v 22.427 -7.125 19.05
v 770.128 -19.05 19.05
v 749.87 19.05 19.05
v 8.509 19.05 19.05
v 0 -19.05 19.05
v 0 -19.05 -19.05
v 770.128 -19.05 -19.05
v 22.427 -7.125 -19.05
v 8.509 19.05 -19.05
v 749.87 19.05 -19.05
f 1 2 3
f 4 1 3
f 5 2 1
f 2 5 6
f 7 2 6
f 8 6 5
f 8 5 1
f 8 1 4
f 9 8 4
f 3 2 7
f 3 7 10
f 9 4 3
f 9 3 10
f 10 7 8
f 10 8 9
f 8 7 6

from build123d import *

# Parameters (mm, degrees)
SKETCH1_W               = 38.1
SKETCH1_H               = 38.1
BOSS_EXTRUDE1_DEPTH     = 770.128
CUT_EXTRUDE1_DEPTH      = 772.305159379
CUT_EXTRUDE2_DEPTH      = 772.305159379
CUT_EXTRUDE2_DEPTH_BACK = 772.305159379


with BuildPart() as part:
    # Sketch1 → Boss-Extrude1 (new body)
    with BuildSketch(Plane(origin=(0, 0, 0), x_dir=(0, 0, -1), z_dir=(1, 0, 0))):
        Rectangle(SKETCH1_W, SKETCH1_H)
    extrude(amount=BOSS_EXTRUDE1_DEPTH)

    # Sketch2 → Cut-Extrude1 (cut, through all)
    with BuildSketch(Plane.XY.offset(19.05)):
        Polygon((770.128, -19.05), (749.869870654, 19.05), (770.128, 19.05), align=None)
    extrude(amount=-CUT_EXTRUDE1_DEPTH, mode=Mode.SUBTRACT)

    # Sketch3 → Cut-Extrude2 (cut, two sides: drawn at the far end of the back side and taken through both)
    with BuildSketch(Plane.XY.offset(19.05).offset(-CUT_EXTRUDE2_DEPTH_BACK)):
        Polygon((0, -19.05), (22.426868859, -7.125422305), (-1.422286531, 37.728315412), (-23.84915539, 25.803737717), align=None)
    extrude(amount=CUT_EXTRUDE2_DEPTH + CUT_EXTRUDE2_DEPTH_BACK, mode=Mode.SUBTRACT)


solid = part.part
